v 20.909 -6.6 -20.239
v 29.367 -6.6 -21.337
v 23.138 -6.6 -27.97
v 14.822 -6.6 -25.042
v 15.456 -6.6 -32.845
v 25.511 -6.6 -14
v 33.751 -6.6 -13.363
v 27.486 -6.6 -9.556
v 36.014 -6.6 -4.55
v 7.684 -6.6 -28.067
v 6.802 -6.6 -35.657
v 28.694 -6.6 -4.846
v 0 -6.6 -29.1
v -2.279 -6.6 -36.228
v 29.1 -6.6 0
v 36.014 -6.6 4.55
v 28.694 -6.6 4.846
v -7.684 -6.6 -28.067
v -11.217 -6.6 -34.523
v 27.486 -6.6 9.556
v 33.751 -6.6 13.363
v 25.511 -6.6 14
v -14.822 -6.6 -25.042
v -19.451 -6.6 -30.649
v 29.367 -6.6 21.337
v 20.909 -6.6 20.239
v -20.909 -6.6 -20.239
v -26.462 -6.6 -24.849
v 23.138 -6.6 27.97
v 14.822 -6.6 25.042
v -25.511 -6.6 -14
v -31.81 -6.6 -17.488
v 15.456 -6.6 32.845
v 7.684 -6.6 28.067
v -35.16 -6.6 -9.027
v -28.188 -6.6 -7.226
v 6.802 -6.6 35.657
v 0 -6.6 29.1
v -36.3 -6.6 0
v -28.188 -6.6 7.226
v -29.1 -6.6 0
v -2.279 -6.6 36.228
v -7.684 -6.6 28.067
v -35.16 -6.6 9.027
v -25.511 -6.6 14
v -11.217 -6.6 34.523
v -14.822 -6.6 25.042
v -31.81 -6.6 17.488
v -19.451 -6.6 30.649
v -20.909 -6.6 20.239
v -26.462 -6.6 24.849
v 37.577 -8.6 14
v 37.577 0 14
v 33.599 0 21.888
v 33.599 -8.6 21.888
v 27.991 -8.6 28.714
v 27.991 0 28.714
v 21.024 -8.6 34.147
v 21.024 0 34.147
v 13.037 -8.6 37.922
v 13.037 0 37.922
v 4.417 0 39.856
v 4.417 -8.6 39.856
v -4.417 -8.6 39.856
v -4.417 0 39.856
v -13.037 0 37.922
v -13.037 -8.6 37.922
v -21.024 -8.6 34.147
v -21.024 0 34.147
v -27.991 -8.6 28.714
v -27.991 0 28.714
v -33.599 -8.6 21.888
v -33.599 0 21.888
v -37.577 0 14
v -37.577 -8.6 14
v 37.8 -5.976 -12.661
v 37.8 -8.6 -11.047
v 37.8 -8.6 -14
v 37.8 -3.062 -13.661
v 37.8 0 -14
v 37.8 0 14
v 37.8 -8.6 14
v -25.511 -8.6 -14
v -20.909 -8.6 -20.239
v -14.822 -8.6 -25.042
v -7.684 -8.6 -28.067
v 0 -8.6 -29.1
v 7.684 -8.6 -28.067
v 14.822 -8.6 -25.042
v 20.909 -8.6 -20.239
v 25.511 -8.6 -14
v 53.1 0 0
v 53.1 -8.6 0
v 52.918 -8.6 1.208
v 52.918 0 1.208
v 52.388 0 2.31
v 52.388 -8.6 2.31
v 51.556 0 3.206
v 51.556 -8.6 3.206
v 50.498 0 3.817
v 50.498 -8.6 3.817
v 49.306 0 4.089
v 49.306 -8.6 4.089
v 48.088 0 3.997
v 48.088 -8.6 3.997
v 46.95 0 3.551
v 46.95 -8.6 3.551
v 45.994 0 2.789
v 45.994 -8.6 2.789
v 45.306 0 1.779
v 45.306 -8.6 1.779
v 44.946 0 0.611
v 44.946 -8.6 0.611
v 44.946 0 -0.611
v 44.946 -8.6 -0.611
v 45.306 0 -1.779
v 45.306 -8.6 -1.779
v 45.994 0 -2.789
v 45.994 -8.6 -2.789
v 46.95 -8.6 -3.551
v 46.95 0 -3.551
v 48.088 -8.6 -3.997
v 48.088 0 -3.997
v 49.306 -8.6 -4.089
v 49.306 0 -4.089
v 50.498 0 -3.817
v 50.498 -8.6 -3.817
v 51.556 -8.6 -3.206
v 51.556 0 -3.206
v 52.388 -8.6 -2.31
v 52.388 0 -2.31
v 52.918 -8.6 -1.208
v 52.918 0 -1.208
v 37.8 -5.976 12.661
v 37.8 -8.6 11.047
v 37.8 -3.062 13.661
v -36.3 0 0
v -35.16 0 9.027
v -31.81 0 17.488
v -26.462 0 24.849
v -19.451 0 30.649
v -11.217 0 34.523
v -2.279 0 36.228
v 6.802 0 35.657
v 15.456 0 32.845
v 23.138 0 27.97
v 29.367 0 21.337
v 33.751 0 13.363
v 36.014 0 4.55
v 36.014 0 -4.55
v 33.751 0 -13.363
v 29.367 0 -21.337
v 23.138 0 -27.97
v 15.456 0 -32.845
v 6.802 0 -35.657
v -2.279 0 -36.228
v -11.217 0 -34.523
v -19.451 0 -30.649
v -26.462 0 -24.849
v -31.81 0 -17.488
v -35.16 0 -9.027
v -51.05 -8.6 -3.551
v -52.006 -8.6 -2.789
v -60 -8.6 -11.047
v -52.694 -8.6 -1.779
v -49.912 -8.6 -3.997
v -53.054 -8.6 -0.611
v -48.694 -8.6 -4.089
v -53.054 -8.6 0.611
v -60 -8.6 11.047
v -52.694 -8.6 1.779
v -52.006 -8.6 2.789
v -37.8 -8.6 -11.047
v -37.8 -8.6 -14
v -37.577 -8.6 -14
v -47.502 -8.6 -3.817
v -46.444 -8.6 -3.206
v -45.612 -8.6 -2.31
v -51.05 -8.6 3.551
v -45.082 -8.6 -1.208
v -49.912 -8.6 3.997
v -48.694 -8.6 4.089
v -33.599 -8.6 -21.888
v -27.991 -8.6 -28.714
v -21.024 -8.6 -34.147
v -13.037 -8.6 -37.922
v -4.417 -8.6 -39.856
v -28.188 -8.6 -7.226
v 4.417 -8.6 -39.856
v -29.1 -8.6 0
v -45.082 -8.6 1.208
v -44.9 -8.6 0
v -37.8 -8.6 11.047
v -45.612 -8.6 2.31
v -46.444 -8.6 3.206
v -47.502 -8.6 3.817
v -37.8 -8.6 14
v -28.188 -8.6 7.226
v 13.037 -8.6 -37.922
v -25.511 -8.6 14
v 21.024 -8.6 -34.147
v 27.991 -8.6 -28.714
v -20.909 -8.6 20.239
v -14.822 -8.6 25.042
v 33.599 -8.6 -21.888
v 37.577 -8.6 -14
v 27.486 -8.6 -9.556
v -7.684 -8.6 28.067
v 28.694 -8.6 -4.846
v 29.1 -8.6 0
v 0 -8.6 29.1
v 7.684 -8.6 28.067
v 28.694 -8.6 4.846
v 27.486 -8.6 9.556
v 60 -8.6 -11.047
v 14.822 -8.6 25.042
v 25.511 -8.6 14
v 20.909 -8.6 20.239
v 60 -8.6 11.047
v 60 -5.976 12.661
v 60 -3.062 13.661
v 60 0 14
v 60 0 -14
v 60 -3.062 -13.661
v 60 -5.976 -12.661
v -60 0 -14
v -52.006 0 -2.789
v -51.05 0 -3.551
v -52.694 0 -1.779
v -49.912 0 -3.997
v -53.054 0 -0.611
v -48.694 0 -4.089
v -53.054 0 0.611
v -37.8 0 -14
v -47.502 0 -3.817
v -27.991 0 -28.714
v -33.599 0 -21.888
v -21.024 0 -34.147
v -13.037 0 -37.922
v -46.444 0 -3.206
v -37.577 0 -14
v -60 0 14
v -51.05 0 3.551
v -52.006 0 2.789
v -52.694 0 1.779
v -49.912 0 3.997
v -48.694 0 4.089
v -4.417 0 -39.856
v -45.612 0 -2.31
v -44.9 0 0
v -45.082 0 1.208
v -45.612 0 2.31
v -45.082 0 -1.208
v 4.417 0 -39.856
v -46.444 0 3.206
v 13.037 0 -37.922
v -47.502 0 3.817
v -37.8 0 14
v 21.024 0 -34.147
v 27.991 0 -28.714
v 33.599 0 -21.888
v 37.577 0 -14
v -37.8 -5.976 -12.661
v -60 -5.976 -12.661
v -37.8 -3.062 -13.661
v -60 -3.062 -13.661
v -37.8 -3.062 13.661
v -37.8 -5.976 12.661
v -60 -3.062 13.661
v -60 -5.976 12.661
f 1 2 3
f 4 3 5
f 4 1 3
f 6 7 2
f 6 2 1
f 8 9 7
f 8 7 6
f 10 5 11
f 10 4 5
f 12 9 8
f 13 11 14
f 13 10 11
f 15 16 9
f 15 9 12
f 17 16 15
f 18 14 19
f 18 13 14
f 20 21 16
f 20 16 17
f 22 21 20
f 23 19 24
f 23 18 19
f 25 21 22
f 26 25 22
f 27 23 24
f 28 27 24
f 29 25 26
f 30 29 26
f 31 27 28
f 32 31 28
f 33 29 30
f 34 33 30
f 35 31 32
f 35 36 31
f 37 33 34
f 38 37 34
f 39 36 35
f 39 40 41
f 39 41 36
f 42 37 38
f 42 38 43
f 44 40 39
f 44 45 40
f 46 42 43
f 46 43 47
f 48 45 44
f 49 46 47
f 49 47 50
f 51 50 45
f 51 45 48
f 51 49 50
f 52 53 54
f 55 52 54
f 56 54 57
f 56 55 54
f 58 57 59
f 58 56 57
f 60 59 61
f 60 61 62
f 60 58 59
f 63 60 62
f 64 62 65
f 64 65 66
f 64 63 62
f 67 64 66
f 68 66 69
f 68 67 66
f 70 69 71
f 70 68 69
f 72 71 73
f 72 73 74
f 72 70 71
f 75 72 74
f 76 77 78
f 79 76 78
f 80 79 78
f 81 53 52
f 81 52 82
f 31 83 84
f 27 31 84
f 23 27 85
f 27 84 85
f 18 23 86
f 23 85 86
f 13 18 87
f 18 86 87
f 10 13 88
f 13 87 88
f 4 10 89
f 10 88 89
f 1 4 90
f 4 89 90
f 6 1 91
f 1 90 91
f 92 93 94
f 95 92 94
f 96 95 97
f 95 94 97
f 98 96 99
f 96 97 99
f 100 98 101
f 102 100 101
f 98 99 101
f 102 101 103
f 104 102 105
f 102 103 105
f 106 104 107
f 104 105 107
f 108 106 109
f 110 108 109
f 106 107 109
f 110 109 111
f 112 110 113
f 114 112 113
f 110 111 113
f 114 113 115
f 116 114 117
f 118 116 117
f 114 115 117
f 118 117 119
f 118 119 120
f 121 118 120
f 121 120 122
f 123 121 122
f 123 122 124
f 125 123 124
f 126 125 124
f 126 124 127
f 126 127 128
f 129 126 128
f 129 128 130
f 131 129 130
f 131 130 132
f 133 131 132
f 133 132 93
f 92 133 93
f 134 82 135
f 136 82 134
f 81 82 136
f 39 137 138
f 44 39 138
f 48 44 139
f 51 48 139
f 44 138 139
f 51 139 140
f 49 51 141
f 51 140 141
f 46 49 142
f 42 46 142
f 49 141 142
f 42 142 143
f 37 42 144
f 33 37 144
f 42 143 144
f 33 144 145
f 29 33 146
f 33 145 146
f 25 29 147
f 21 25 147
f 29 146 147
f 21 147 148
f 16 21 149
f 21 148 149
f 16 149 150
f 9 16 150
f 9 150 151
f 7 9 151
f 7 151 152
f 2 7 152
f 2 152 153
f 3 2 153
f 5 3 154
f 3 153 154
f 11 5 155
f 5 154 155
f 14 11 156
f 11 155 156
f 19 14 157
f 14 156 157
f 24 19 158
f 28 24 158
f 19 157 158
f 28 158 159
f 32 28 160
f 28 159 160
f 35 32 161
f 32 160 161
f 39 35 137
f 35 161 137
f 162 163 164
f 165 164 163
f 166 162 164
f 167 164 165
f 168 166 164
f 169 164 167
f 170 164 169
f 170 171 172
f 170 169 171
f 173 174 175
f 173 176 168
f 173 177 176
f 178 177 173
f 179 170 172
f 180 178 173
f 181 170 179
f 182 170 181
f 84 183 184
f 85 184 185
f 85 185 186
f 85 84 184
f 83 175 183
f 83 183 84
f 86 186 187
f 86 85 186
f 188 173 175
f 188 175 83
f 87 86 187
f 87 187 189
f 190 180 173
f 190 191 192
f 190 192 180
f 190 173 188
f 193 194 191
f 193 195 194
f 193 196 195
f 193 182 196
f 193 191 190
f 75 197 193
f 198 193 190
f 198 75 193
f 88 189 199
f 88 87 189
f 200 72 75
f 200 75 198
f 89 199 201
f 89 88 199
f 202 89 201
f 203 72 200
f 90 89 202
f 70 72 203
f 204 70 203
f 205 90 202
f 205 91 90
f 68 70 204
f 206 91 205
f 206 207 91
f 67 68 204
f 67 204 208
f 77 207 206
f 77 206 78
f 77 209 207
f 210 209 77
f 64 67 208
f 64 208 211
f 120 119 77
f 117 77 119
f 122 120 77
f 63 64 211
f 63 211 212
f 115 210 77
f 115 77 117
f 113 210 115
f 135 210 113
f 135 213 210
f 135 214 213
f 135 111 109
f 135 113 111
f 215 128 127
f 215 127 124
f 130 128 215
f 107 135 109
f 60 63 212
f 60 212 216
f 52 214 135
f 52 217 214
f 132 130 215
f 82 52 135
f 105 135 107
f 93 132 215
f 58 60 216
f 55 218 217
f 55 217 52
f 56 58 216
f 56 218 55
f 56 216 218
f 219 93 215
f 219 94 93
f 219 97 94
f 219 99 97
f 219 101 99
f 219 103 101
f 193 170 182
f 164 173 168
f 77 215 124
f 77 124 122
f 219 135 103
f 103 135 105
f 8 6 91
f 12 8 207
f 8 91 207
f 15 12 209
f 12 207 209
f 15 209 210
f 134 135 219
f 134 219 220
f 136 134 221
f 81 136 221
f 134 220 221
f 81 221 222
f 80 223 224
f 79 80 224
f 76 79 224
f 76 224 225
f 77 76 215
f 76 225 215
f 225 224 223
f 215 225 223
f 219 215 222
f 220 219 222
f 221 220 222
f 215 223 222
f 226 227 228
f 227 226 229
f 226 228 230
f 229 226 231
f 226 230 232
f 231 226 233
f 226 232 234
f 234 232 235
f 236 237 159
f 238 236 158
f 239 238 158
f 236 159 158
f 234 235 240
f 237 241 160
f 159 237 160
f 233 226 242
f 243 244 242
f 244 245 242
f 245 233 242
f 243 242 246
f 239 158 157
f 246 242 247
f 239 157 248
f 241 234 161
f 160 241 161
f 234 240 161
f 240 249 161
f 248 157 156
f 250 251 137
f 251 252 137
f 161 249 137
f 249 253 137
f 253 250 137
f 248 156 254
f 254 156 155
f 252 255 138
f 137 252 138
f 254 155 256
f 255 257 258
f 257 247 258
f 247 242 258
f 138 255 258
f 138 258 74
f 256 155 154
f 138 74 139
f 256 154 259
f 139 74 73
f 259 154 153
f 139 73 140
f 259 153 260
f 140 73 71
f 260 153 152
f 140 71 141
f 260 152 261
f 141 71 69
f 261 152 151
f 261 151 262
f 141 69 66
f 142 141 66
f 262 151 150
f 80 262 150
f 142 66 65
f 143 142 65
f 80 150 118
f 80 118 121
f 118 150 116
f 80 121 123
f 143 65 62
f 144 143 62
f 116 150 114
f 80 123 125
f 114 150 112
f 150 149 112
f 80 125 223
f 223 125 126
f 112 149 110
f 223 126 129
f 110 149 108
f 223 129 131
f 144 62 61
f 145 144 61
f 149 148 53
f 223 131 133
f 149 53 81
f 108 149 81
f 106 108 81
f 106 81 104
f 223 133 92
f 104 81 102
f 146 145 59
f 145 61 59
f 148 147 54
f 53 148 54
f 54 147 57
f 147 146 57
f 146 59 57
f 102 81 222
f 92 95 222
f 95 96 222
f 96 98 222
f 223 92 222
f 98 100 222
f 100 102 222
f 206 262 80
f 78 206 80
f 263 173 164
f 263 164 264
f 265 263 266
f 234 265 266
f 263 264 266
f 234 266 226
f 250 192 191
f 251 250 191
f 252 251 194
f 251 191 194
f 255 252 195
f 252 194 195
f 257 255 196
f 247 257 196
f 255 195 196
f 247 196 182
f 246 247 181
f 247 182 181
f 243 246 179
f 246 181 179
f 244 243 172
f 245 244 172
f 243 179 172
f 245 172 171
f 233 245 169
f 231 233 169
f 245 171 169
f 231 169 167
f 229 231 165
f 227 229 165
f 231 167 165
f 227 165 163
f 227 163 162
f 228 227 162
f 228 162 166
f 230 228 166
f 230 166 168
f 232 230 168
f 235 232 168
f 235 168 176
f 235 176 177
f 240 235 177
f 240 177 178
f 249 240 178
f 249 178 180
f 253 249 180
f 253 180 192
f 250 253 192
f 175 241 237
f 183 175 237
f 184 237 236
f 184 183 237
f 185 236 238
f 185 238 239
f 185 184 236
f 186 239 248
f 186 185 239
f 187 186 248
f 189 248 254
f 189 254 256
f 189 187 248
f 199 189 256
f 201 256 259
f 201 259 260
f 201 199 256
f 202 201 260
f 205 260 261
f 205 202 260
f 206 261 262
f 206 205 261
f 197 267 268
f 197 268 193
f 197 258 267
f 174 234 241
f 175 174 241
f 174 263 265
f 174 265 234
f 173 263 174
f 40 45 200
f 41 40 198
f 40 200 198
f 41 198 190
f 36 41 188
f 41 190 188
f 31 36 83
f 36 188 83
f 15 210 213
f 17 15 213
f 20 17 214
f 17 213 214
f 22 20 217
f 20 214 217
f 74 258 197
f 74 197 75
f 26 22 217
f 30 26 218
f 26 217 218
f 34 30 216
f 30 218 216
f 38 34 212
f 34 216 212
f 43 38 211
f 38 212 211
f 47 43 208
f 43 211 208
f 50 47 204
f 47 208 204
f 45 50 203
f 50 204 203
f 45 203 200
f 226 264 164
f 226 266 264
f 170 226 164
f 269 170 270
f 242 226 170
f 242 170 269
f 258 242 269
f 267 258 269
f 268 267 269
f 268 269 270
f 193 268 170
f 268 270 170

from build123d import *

# Parameters (mm, degrees)
F0_W      = 120
F0_H      = 28
F1_DEPTH  = 8.6
F3_DEPTH  = 8.601
F2_R      = 40.1
F2_R_2    = 29.1
F4_DEPTH  = 8.6
F6_R      = 4.1
F7_DEPTH  = 8.601
F9_DEPTH  = 22.2
F11_DEPTH = 22.2
F12_R     = 36.3
F12_R_2   = 29.1
F13_DEPTH = 6.6


with BuildPart() as f1:
    # F0 (on Front) → F1 (new body)
    with BuildSketch(Plane.XZ):
        Rectangle(F0_W, F0_H)
    extrude(amount=F1_DEPTH)

    # F2 (on face) → F3 (cut, through all)
    with BuildSketch(Plane.XZ.offset(8.6)):
        with BuildLine():
            Line((-25.5109780291, 14), (25.5109780291, 14))
            ThreePointArc((25.5109780291, 14), (0, 29.1), (-25.5109780291, 14))
        make_face()
        with BuildLine():
            ThreePointArc((29.1, 0), (28.1884680379, 7.2263593653), (25.5109780291, 14))
            Line((25.5109780291, 14), (-25.5109780291, 14))
            ThreePointArc((-25.5109780291, 14), (-29.1, 0), (-25.5109780291, -14))
            Line((-25.5109780291, -14), (25.5109780291, -14))
            ThreePointArc((25.5109780291, -14), (28.1884680379, -7.2263593653), (29.1, 0))
        make_face()
        with BuildLine():
            ThreePointArc((-25.5109780291, -14), (0, -29.1), (25.5109780291, -14))
            Line((25.5109780291, -14), (-25.5109780291, -14))
        make_face()
    extrude(amount=-F3_DEPTH, mode=Mode.SUBTRACT)


with BuildPart() as f4:
    # F2 (on face) → F4 (new body)
    with BuildSketch(Plane.XZ.offset(8.6)):
        Circle(F2_R)
        Circle(F2_R_2, mode=Mode.SUBTRACT)
    extrude(amount=-F4_DEPTH)


with BuildPart() as f1_1:
    add(f1.part)

    # F5: union F4
    add(f4.part)

    # F6 (on face) → F7 (cut, through all)
    with BuildSketch(Plane.XZ.offset(8.6)):
        with Locations((-49, 0)):
            Circle(F6_R)
        with Locations((49, 0)):
            Circle(F6_R)
    extrude(amount=-F7_DEPTH, mode=Mode.SUBTRACT)

    # F8 (on face) → F9 (cut)
    with BuildSketch(Plane.YZ.offset(60)):
        with BuildLine():
            ThreePointArc((-8.6, 11.0471715837), (-4.5464050539, 13.2412311016), (0, 14))
            Line((0, 14), (-8.6, 14))
            Line((-8.6, 14), (-8.6, 11.0471715837))
        make_face()
        with BuildLine():
            Line((-8.6, -14), (0, -14))
            ThreePointArc((0, -14), (-4.5464050539, -13.2412311016), (-8.6, -11.0471715837))
            Line((-8.6, -11.0471715837), (-8.6, -14))
        make_face()
    extrude(amount=-F9_DEPTH, mode=Mode.SUBTRACT)

    # F10 (on face) → F11 (cut)
    with BuildSketch(Plane(origin=(-60, 0, 0), x_dir=(0, -1, 0), z_dir=(-1, 0, 0))):
        with BuildLine():
            Line((8.6, 14), (0, 14))
            ThreePointArc((0, 14), (4.5464050539, 13.2412311016), (8.6, 11.0471715837))
            Line((8.6, 11.0471715837), (8.6, 14))
        make_face()
        with BuildLine():
            ThreePointArc((8.6, -11.0471715837), (4.5464050539, -13.2412311016), (0, -14))
            Line((0, -14), (8.6, -14))
            Line((8.6, -14), (8.6, -11.0471715837))
        make_face()
    extrude(amount=-F11_DEPTH, mode=Mode.SUBTRACT)

    # F12 (on face) → F13 (cut)
    with BuildSketch(Plane(origin=(0, 0, 0), x_dir=(-1, 0, 0), z_dir=(0, 1, 0))):
        Circle(F12_R)
        Circle(F12_R_2, mode=Mode.SUBTRACT)
    extrude(amount=-F13_DEPTH, mode=Mode.SUBTRACT)


solid = f1_1.part
